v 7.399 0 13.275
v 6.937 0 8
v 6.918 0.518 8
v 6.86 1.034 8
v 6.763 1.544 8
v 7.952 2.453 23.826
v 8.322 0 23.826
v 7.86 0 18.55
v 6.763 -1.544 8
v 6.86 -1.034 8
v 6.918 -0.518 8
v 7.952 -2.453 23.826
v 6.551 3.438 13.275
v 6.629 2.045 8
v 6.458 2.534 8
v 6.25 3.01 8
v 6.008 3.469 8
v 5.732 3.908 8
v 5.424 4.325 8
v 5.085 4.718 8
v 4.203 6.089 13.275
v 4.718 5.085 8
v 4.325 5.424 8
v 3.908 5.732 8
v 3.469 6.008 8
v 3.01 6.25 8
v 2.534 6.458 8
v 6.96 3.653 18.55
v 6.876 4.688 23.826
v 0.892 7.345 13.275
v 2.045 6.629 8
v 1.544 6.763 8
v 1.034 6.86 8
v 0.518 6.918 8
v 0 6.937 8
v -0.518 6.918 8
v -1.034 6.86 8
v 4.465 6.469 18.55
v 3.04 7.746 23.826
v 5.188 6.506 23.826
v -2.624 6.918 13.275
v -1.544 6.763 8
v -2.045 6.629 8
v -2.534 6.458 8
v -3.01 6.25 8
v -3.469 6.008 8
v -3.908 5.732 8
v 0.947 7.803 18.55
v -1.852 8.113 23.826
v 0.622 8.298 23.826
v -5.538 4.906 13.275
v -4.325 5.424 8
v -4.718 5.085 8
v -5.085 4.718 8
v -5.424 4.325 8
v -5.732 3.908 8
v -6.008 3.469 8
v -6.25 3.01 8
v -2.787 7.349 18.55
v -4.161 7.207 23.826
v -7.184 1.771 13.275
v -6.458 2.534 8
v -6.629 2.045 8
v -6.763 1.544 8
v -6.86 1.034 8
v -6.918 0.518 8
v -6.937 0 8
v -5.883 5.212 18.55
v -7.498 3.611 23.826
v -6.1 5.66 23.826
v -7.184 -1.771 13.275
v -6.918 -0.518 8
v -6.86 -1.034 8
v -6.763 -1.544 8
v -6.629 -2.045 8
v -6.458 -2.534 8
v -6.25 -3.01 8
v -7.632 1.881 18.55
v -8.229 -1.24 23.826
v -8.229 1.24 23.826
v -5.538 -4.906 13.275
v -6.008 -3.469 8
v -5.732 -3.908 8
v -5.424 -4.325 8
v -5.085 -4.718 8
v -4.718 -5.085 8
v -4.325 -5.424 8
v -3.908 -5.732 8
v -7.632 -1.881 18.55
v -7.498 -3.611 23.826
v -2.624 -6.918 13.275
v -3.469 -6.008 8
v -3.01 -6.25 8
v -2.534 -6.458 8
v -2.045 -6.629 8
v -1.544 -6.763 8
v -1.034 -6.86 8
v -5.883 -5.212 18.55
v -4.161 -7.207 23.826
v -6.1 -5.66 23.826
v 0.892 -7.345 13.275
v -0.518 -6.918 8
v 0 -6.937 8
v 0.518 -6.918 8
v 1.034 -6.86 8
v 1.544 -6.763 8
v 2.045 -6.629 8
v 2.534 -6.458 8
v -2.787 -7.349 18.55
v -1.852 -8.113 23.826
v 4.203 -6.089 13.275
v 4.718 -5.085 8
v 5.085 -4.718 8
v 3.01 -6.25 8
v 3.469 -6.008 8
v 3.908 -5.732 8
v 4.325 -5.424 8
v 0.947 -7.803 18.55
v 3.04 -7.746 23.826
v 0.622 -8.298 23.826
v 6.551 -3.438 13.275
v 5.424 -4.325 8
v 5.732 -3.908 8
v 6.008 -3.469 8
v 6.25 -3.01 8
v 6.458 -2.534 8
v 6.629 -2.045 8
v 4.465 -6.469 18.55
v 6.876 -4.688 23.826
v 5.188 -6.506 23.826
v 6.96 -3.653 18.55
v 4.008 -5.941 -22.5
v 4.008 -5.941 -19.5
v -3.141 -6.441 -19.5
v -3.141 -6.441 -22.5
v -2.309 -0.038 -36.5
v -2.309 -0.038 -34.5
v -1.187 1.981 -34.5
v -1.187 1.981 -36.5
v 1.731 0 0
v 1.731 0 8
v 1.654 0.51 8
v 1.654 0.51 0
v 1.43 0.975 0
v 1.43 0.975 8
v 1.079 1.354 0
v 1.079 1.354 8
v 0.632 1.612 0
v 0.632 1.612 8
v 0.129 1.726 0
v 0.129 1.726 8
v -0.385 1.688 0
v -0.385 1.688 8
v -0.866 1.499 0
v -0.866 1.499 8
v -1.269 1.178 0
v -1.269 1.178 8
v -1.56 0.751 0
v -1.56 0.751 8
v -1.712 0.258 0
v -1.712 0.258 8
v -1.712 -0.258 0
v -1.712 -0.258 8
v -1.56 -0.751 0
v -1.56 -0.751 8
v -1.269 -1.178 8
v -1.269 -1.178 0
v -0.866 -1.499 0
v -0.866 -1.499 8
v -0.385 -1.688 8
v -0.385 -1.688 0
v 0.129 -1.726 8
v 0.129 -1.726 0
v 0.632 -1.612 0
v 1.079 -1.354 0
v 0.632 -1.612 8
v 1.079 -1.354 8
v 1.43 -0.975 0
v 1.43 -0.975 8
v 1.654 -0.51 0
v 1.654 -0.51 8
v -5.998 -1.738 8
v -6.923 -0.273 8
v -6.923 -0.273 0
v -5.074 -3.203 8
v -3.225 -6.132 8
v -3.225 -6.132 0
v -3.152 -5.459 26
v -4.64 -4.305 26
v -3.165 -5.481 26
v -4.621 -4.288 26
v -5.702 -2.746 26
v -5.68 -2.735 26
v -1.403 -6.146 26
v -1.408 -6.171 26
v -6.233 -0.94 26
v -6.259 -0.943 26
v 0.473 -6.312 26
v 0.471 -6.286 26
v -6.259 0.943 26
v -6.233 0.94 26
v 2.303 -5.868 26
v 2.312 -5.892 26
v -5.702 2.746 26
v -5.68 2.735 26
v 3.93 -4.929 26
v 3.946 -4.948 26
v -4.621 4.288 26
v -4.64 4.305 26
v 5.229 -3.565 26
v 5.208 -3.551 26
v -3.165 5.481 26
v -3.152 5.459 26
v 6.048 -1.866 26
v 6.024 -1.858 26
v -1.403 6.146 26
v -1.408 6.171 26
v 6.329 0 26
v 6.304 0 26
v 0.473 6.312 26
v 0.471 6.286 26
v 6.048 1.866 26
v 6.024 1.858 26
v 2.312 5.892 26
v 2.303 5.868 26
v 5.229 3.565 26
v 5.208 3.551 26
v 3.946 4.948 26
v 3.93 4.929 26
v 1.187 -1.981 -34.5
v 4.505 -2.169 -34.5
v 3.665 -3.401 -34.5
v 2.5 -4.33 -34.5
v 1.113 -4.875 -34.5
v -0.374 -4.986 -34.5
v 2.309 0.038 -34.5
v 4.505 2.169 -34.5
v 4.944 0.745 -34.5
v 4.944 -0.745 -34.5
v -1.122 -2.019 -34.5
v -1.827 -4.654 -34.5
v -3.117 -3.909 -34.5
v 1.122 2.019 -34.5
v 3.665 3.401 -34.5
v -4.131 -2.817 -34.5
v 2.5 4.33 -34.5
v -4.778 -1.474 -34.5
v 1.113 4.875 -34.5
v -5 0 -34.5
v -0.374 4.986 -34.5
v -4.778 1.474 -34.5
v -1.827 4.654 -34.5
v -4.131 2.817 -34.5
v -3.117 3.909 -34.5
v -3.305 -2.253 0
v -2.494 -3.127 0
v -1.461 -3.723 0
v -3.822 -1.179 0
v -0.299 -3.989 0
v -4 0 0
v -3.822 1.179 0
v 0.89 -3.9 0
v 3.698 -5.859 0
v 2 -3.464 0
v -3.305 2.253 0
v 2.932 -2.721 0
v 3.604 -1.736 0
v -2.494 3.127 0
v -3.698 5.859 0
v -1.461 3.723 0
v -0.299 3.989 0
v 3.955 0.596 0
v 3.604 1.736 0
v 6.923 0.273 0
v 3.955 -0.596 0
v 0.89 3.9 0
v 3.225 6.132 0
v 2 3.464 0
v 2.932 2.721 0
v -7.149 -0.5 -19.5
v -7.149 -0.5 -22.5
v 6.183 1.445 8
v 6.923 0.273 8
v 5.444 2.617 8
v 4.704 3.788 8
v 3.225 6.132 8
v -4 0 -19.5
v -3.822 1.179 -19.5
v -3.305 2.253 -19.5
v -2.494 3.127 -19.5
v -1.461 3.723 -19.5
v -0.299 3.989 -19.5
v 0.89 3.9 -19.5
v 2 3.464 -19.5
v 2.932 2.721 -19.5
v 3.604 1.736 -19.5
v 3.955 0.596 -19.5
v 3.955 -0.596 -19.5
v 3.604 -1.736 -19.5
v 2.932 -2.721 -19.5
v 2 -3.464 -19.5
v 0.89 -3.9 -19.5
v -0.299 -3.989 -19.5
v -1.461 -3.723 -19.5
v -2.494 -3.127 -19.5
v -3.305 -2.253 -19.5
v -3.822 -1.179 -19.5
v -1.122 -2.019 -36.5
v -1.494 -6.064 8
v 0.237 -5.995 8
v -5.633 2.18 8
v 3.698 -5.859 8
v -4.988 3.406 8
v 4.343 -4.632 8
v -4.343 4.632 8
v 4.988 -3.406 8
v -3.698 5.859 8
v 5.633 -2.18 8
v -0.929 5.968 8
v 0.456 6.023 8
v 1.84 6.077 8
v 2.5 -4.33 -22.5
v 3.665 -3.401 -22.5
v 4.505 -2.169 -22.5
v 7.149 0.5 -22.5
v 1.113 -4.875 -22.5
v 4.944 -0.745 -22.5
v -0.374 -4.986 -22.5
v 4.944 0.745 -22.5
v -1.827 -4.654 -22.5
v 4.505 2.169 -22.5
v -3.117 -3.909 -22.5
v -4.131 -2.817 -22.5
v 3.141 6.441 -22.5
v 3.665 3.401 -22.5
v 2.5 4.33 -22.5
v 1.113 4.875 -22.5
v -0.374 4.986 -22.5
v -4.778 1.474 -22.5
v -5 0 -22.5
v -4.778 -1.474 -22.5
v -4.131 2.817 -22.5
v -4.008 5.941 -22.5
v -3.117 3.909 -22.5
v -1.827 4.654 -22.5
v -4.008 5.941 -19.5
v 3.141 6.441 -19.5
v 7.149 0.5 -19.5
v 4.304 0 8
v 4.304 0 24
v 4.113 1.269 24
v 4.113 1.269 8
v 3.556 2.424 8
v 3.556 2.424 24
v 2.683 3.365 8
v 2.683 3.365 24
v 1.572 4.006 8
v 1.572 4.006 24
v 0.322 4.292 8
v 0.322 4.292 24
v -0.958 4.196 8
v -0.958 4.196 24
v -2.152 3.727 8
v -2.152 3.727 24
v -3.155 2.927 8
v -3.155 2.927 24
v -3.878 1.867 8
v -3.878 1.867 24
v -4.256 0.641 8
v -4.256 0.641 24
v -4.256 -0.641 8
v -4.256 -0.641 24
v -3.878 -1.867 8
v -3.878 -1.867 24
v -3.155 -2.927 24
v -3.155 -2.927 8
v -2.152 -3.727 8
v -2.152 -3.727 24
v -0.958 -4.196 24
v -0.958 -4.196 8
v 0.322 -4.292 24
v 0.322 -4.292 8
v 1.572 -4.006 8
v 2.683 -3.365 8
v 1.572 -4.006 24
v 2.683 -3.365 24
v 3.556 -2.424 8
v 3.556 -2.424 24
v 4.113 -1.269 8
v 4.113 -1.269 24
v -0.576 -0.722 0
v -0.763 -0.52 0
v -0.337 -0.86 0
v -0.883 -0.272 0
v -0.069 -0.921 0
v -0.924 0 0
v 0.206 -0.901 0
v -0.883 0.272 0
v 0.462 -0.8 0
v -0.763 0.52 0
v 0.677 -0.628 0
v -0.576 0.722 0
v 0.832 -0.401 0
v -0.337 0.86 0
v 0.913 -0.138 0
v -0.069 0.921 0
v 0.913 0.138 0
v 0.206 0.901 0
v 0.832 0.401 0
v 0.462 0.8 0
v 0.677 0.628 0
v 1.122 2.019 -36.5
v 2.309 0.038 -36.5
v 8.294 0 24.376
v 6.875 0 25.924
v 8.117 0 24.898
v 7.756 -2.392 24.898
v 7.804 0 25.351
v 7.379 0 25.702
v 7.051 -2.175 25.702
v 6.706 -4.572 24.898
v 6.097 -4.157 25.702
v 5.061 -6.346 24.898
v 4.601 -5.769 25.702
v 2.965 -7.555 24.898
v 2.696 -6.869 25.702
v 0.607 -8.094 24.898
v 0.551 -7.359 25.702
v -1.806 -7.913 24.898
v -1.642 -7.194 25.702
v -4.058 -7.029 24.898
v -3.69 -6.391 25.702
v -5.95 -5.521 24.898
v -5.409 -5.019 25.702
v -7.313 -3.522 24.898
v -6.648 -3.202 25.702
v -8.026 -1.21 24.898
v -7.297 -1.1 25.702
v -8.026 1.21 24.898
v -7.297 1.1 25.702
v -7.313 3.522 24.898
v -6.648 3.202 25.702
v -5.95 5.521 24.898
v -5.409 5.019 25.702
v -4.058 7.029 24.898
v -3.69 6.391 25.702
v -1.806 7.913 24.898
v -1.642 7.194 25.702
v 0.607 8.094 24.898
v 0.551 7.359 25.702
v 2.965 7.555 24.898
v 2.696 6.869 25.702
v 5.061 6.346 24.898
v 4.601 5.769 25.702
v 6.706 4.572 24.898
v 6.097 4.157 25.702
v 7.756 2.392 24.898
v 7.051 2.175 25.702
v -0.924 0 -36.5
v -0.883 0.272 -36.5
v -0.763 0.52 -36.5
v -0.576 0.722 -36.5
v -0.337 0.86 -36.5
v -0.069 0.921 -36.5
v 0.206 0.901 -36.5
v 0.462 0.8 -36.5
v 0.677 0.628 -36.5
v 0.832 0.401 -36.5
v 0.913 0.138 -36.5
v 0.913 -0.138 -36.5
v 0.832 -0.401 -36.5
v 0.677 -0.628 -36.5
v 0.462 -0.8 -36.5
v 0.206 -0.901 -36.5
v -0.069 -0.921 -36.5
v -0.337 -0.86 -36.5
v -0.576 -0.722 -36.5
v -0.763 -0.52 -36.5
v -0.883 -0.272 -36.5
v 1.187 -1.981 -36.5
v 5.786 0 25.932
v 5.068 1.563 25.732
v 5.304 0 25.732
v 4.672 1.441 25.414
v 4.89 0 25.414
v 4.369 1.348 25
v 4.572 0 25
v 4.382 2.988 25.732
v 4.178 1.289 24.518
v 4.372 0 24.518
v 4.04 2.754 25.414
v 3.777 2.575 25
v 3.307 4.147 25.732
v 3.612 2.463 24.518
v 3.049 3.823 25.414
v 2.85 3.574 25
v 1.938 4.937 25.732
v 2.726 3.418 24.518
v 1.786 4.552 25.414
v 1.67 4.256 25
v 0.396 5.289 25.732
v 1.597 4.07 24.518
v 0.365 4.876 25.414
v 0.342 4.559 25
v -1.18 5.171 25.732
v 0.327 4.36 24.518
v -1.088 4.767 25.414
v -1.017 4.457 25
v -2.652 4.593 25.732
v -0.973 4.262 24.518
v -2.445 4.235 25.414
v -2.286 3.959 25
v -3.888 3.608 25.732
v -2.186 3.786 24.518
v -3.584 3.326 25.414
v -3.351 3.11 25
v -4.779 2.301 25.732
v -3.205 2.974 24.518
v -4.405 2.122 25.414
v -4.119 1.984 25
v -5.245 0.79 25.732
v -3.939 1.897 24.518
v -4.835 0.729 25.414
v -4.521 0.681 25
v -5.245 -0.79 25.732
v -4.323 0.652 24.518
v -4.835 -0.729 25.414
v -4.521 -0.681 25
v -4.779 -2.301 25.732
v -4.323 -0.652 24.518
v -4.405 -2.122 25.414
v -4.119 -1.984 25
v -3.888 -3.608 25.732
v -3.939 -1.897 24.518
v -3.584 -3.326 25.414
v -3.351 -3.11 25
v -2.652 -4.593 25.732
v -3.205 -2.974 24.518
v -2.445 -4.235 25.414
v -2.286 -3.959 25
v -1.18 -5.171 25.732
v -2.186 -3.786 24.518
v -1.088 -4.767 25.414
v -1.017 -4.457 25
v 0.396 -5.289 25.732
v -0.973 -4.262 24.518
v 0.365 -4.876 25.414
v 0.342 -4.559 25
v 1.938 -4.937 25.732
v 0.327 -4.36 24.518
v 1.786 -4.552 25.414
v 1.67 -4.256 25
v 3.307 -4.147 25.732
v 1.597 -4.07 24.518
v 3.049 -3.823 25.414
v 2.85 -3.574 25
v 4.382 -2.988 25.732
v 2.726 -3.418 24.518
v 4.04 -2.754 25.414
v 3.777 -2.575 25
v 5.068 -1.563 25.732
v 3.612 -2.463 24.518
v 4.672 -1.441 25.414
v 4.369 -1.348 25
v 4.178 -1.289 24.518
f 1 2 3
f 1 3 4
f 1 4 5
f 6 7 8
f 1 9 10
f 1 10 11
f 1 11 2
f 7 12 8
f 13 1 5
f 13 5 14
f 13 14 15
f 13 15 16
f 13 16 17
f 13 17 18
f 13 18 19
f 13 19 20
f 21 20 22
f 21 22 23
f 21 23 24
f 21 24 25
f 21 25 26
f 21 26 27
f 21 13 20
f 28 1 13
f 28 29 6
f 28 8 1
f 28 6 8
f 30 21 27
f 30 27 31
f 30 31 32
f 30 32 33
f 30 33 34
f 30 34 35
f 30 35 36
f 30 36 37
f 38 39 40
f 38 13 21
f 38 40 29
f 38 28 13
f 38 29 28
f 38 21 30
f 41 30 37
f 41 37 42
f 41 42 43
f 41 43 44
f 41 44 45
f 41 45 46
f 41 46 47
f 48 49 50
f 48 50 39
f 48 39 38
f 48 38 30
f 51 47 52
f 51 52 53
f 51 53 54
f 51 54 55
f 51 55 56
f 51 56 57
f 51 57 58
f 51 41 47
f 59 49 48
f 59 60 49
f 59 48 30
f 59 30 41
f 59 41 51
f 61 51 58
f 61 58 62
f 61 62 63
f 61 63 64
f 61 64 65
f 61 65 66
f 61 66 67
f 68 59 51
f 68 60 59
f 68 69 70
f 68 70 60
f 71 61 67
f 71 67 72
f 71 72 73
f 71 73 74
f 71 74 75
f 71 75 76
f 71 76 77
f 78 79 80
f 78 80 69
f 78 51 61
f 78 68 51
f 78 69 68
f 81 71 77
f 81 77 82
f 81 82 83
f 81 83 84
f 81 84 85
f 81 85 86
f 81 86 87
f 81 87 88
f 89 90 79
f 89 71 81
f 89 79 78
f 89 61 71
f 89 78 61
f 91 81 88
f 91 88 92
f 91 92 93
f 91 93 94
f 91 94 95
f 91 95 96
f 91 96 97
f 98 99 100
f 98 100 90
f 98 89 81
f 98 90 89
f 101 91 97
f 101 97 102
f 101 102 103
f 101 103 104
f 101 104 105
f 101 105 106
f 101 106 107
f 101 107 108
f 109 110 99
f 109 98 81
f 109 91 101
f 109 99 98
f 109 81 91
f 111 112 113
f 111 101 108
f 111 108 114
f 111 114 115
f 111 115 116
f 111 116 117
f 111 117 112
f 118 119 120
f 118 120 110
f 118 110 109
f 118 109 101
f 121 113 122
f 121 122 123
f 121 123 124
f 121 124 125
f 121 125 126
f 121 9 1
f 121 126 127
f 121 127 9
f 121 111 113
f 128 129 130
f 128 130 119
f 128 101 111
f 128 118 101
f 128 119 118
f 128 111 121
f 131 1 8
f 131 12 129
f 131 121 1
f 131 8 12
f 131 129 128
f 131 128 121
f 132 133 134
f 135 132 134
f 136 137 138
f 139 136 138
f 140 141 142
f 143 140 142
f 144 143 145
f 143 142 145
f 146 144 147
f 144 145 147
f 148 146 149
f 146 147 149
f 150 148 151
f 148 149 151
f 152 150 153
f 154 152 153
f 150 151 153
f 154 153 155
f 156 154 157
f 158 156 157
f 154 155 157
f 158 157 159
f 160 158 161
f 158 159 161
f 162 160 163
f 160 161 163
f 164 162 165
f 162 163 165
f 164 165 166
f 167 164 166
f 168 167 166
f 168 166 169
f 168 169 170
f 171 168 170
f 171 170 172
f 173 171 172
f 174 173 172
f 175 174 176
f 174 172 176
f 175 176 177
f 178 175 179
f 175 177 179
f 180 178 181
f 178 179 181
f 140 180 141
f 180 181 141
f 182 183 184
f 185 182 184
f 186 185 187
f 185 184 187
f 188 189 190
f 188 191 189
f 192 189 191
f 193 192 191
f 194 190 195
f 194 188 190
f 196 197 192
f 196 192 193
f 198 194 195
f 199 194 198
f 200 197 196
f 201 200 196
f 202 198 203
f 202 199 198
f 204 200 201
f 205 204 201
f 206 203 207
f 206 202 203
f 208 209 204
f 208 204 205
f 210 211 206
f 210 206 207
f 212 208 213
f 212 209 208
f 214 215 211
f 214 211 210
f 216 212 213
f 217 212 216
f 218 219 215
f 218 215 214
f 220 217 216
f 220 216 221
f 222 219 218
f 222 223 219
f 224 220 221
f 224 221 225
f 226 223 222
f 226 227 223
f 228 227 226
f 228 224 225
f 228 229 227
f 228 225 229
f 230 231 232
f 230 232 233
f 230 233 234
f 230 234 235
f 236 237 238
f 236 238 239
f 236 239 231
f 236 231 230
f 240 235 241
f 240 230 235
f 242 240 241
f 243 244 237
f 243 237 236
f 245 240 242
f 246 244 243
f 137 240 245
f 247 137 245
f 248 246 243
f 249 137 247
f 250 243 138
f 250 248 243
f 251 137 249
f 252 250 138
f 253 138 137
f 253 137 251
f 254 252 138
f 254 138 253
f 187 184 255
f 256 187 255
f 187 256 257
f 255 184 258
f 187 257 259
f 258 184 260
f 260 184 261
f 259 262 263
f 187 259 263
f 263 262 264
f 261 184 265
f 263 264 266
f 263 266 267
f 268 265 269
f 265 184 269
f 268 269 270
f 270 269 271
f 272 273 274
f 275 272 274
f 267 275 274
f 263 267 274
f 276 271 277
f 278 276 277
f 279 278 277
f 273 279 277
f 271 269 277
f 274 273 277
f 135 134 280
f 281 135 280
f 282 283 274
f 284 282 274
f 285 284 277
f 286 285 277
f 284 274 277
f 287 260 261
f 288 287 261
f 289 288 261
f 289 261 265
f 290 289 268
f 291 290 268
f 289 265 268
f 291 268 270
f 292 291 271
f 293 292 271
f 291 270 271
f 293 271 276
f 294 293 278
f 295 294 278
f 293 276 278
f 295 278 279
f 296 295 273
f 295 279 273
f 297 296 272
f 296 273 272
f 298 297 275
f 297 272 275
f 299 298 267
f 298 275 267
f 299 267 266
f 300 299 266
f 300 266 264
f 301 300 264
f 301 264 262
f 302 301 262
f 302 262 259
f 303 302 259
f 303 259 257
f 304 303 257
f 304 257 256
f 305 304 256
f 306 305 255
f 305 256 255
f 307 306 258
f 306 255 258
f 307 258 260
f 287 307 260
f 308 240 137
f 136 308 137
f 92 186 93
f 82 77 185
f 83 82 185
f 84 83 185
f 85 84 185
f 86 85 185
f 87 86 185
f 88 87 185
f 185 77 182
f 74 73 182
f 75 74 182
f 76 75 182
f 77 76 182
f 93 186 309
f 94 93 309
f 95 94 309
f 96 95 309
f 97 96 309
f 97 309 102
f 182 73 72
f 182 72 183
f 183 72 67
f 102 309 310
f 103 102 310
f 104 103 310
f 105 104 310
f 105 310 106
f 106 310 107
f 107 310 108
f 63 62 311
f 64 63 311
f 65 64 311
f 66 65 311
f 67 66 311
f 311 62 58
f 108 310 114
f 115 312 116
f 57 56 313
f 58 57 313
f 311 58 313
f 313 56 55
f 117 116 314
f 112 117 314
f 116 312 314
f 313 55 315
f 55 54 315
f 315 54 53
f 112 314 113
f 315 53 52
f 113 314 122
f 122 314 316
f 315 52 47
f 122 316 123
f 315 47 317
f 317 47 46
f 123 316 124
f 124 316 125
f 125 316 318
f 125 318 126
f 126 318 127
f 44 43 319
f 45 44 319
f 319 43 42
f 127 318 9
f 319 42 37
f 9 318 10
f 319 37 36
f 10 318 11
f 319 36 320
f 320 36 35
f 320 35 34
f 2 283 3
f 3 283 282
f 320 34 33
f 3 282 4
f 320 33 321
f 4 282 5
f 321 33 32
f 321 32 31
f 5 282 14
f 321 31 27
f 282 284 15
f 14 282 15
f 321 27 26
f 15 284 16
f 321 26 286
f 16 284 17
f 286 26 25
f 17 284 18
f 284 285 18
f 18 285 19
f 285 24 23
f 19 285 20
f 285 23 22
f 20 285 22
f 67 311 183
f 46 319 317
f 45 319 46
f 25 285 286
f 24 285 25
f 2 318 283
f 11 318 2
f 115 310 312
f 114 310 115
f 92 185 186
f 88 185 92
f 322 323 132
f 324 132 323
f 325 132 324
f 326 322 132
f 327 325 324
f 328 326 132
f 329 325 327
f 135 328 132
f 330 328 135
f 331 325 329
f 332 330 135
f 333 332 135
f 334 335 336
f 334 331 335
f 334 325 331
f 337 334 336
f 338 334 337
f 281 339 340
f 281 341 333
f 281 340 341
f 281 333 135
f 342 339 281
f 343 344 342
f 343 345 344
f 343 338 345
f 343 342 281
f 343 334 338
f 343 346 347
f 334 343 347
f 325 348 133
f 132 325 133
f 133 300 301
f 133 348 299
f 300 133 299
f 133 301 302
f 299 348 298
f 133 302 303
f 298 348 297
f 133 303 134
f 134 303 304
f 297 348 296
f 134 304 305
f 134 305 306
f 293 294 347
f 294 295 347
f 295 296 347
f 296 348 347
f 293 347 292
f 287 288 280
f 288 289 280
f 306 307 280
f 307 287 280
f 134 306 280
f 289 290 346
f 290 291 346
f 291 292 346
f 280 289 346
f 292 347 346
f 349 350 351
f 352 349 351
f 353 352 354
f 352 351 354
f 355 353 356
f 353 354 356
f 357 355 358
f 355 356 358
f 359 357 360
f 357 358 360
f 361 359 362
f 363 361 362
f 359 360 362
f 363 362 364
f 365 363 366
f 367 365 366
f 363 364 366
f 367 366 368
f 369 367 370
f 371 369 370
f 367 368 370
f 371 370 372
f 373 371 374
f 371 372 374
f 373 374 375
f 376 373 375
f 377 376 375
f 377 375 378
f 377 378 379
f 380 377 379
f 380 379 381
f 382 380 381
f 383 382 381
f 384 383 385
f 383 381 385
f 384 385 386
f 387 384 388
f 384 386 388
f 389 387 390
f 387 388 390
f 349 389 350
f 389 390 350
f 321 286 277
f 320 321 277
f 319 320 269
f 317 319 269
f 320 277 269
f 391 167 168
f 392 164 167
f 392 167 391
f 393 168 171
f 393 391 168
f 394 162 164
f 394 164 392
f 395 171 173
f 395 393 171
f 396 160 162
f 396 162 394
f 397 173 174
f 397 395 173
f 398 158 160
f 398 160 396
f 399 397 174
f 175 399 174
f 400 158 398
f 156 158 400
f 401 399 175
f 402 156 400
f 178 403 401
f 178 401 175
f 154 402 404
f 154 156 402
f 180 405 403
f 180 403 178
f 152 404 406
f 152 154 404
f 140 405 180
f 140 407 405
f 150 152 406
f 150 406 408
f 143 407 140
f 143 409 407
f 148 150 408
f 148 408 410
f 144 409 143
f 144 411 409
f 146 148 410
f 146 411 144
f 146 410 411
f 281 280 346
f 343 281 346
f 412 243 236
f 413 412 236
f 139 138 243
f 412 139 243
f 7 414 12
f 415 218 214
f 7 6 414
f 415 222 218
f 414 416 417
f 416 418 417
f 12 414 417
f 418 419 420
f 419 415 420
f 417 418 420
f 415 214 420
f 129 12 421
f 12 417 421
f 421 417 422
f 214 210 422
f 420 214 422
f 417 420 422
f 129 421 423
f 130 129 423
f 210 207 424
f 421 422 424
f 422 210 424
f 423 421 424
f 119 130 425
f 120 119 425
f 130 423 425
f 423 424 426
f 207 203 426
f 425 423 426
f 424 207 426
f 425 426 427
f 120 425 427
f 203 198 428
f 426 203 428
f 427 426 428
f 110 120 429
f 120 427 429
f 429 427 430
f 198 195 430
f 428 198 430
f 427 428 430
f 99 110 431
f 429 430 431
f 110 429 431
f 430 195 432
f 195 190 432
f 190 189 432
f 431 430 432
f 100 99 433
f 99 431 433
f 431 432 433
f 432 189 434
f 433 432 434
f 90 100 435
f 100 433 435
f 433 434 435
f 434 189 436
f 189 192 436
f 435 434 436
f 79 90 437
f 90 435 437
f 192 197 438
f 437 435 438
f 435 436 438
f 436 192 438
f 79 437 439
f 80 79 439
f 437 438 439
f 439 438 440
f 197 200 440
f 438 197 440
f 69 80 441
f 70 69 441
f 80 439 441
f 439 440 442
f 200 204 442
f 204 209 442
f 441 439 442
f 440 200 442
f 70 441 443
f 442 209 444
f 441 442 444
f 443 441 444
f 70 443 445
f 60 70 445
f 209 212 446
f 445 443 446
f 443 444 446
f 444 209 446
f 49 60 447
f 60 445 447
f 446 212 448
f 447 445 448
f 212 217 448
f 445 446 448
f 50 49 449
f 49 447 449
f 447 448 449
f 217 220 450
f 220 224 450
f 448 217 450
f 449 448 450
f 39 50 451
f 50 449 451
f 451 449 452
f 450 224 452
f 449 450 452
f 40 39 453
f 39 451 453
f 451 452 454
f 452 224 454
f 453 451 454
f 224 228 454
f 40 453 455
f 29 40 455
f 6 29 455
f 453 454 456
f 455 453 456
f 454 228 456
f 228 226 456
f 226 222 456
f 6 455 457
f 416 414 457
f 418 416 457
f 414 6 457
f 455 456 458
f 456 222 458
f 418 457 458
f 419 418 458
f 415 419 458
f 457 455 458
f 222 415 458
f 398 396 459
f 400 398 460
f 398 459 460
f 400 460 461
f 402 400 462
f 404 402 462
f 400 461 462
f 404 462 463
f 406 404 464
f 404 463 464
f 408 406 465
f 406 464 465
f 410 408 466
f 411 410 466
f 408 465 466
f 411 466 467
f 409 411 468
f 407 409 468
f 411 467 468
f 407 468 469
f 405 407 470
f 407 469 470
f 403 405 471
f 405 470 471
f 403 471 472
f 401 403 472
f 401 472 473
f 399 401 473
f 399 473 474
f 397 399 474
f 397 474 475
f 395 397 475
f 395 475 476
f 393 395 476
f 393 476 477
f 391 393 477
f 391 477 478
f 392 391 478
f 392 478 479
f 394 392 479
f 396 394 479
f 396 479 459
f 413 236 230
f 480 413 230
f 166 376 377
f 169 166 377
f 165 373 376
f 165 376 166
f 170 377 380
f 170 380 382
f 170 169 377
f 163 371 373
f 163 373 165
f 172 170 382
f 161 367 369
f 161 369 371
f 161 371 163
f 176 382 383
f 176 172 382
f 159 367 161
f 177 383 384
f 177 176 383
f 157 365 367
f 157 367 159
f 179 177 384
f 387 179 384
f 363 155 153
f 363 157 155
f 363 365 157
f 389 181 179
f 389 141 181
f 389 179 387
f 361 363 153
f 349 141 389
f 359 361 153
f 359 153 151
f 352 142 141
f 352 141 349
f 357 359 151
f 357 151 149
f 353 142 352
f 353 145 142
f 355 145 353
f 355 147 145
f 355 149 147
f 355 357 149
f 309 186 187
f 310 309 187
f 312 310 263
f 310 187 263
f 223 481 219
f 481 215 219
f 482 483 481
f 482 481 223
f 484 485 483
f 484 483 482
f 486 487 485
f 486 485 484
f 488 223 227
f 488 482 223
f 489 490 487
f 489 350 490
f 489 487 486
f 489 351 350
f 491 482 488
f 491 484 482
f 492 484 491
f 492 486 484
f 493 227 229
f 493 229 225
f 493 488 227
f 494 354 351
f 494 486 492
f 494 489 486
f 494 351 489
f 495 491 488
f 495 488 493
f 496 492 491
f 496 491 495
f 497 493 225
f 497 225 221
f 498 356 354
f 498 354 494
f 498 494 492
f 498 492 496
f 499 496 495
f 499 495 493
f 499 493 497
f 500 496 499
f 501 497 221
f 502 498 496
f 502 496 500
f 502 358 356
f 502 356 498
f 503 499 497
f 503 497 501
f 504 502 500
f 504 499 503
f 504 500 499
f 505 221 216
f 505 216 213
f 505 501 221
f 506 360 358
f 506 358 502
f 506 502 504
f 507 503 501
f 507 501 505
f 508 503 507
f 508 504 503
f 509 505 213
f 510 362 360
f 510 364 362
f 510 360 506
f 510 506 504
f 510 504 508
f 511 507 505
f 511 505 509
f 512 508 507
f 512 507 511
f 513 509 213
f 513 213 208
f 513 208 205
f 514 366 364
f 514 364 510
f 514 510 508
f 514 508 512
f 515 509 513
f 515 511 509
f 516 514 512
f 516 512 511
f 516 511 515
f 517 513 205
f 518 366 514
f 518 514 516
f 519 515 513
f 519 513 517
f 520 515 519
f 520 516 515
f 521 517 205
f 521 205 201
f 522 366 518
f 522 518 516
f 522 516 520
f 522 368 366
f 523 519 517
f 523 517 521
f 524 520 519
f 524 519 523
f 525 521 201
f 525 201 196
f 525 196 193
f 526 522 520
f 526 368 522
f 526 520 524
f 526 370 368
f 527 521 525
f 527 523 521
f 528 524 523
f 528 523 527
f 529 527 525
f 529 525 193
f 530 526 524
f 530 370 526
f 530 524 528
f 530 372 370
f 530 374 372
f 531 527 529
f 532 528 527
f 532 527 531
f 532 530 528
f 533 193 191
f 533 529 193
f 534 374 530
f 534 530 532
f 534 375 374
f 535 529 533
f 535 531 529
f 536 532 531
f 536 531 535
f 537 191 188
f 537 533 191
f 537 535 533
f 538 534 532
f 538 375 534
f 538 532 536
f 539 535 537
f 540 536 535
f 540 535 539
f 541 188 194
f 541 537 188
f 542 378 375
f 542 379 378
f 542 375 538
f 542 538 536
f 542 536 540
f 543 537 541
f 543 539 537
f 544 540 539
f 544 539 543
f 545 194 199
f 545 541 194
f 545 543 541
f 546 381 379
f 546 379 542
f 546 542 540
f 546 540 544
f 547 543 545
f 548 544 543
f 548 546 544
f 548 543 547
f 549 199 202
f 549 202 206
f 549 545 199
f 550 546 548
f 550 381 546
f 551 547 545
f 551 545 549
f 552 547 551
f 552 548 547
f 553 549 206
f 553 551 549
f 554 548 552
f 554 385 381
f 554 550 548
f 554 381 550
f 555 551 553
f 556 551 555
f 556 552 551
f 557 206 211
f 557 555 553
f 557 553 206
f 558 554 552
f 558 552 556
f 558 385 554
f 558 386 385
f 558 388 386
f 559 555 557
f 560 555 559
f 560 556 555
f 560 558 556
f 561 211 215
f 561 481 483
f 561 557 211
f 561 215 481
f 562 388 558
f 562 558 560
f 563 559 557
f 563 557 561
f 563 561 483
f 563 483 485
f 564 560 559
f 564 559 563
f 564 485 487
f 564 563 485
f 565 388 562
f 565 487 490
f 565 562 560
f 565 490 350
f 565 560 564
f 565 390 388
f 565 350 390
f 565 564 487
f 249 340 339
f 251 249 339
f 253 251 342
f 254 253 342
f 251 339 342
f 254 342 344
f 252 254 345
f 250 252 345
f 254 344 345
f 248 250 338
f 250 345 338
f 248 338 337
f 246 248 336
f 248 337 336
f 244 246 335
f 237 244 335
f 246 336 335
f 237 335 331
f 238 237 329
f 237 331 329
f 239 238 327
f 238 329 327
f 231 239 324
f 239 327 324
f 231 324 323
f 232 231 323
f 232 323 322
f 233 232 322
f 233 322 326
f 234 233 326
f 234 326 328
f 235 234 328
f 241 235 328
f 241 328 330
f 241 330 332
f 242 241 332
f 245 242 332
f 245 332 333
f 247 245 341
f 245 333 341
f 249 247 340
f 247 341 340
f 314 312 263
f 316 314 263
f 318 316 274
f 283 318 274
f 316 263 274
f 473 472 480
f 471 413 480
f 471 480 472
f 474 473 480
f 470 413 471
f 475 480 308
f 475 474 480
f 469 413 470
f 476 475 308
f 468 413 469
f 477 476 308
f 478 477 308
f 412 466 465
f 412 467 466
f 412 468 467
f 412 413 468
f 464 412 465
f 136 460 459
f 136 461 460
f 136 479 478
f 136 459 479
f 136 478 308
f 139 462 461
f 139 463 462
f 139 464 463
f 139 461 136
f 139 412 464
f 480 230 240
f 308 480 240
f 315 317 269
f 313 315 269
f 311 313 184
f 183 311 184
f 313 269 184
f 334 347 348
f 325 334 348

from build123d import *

# Parameters (mm, degrees)
EXTRUDE_1_DEPTH     = 8
SKETCH_2_R          = 4
EXTRUDE_2_DEPTH     = 19.5
EXTRUDE_3_DEPTH     = 3
SKETCH_4_R          = 5
EXTRUDE_4_DEPTH     = 12
EXTRUDE_5_DEPTH     = 2
SKETCH_10_R         = 6.937077861
EXTRUDE_6_DEPTH     = 18
EXTRUDE_6_TAPER     = -5
SKETCH_11_R         = 4.303815727
CUT_EXTRUDE_2_DEPTH = 18
SKETCH_12_R         = 1.731234863
CUT_EXTRUDE_3_DEPTH = 8
FILLET_1_R          = 2
SKETCH_13_R         = 0.923714742
CUT_EXTRUDE_4_DEPTH = 63.5


with BuildPart() as part:
    # 草图1 → 凸台-拉伸1 (new body)
    with BuildSketch(Plane.XY):
        Polygon((-3.698048527, 5.858706094), (-6.922812574, -0.273250922), (-3.224764047, -6.131957016), (3.698048527, -5.858706094), (6.922812574, 0.273250922), (3.224764047, 6.131957016), align=None)
    extrude(amount=EXTRUDE_1_DEPTH)

    # 草图2 → 凸台-拉伸2 (add)
    with BuildSketch(Plane(origin=(0, 0, 0), x_dir=(-1, 0, 0), z_dir=(0, 0, -1))):
        Circle(SKETCH_2_R)
    extrude(amount=EXTRUDE_2_DEPTH)

    # 草图3 → 凸台-拉伸3 (add)
    with BuildSketch(Plane(origin=(0, 0, -19.5), x_dir=(-1, 0, 0), z_dir=(0, 0, -1))):
        Polygon((4.007714345, 5.941327246), (-3.141483154, 6.441446057), (-7.149197499, 0.500118811), (-4.007714345, -5.941327246), (3.141483154, -6.441446057), (7.149197499, -0.500118811), align=None)
    extrude(amount=EXTRUDE_3_DEPTH)

    # 草图4 → 凸台-拉伸4 (add)
    with BuildSketch(Plane(origin=(0, 0, -22.5), x_dir=(-1, 0, 0), z_dir=(0, 0, -1))):
        Circle(SKETCH_4_R)
    extrude(amount=EXTRUDE_4_DEPTH)

    # 草图5 → 凸台-拉伸5 (add)
    with BuildSketch(Plane(origin=(0, 0, -34.5), x_dir=(-1, 0, 0), z_dir=(0, 0, -1))):
        Polygon((1.187065622, 1.98096152), (-1.122030189, 2.018509744), (-2.309095811, 0.037548225), (-1.187065622, -1.98096152), (1.122030189, -2.018509744), (2.309095811, -0.037548225), align=None)
    extrude(amount=EXTRUDE_5_DEPTH)

    # 草图10 → 凸台-拉伸6 (add)
    with BuildSketch(Plane.XY.offset(8)):
        Circle(SKETCH_10_R)
    extrude(amount=EXTRUDE_6_DEPTH, taper=EXTRUDE_6_TAPER)

    # 草图11 → 切除-拉伸2 (cut)
    with BuildSketch(Plane.XY.offset(26)):
        Circle(SKETCH_11_R)
    extrude(amount=-CUT_EXTRUDE_2_DEPTH, mode=Mode.SUBTRACT)

    # 草图12 → 切除-拉伸3 (cut)
    with BuildSketch(Plane.XY.offset(8)):
        Circle(SKETCH_12_R)
    extrude(amount=-CUT_EXTRUDE_3_DEPTH, mode=Mode.SUBTRACT)

    # 圆角1
    fillet_1_edges = [part.edges().sort_by_distance(p)[0] for p in [
        (-8.511873804, 0, 26),
        (-4.303815727, 0, 26),
    ]]
    fillet(fillet_1_edges, radius=FILLET_1_R)

    # 草图13 → 切除-拉伸4 (cut, through all)
    with BuildSketch(Plane(origin=(0, 0, -36.5), x_dir=(-1, 0, 0), z_dir=(0, 0, -1))):
        Circle(SKETCH_13_R)
    extrude(amount=-CUT_EXTRUDE_4_DEPTH, mode=Mode.SUBTRACT)


solid = part.part
